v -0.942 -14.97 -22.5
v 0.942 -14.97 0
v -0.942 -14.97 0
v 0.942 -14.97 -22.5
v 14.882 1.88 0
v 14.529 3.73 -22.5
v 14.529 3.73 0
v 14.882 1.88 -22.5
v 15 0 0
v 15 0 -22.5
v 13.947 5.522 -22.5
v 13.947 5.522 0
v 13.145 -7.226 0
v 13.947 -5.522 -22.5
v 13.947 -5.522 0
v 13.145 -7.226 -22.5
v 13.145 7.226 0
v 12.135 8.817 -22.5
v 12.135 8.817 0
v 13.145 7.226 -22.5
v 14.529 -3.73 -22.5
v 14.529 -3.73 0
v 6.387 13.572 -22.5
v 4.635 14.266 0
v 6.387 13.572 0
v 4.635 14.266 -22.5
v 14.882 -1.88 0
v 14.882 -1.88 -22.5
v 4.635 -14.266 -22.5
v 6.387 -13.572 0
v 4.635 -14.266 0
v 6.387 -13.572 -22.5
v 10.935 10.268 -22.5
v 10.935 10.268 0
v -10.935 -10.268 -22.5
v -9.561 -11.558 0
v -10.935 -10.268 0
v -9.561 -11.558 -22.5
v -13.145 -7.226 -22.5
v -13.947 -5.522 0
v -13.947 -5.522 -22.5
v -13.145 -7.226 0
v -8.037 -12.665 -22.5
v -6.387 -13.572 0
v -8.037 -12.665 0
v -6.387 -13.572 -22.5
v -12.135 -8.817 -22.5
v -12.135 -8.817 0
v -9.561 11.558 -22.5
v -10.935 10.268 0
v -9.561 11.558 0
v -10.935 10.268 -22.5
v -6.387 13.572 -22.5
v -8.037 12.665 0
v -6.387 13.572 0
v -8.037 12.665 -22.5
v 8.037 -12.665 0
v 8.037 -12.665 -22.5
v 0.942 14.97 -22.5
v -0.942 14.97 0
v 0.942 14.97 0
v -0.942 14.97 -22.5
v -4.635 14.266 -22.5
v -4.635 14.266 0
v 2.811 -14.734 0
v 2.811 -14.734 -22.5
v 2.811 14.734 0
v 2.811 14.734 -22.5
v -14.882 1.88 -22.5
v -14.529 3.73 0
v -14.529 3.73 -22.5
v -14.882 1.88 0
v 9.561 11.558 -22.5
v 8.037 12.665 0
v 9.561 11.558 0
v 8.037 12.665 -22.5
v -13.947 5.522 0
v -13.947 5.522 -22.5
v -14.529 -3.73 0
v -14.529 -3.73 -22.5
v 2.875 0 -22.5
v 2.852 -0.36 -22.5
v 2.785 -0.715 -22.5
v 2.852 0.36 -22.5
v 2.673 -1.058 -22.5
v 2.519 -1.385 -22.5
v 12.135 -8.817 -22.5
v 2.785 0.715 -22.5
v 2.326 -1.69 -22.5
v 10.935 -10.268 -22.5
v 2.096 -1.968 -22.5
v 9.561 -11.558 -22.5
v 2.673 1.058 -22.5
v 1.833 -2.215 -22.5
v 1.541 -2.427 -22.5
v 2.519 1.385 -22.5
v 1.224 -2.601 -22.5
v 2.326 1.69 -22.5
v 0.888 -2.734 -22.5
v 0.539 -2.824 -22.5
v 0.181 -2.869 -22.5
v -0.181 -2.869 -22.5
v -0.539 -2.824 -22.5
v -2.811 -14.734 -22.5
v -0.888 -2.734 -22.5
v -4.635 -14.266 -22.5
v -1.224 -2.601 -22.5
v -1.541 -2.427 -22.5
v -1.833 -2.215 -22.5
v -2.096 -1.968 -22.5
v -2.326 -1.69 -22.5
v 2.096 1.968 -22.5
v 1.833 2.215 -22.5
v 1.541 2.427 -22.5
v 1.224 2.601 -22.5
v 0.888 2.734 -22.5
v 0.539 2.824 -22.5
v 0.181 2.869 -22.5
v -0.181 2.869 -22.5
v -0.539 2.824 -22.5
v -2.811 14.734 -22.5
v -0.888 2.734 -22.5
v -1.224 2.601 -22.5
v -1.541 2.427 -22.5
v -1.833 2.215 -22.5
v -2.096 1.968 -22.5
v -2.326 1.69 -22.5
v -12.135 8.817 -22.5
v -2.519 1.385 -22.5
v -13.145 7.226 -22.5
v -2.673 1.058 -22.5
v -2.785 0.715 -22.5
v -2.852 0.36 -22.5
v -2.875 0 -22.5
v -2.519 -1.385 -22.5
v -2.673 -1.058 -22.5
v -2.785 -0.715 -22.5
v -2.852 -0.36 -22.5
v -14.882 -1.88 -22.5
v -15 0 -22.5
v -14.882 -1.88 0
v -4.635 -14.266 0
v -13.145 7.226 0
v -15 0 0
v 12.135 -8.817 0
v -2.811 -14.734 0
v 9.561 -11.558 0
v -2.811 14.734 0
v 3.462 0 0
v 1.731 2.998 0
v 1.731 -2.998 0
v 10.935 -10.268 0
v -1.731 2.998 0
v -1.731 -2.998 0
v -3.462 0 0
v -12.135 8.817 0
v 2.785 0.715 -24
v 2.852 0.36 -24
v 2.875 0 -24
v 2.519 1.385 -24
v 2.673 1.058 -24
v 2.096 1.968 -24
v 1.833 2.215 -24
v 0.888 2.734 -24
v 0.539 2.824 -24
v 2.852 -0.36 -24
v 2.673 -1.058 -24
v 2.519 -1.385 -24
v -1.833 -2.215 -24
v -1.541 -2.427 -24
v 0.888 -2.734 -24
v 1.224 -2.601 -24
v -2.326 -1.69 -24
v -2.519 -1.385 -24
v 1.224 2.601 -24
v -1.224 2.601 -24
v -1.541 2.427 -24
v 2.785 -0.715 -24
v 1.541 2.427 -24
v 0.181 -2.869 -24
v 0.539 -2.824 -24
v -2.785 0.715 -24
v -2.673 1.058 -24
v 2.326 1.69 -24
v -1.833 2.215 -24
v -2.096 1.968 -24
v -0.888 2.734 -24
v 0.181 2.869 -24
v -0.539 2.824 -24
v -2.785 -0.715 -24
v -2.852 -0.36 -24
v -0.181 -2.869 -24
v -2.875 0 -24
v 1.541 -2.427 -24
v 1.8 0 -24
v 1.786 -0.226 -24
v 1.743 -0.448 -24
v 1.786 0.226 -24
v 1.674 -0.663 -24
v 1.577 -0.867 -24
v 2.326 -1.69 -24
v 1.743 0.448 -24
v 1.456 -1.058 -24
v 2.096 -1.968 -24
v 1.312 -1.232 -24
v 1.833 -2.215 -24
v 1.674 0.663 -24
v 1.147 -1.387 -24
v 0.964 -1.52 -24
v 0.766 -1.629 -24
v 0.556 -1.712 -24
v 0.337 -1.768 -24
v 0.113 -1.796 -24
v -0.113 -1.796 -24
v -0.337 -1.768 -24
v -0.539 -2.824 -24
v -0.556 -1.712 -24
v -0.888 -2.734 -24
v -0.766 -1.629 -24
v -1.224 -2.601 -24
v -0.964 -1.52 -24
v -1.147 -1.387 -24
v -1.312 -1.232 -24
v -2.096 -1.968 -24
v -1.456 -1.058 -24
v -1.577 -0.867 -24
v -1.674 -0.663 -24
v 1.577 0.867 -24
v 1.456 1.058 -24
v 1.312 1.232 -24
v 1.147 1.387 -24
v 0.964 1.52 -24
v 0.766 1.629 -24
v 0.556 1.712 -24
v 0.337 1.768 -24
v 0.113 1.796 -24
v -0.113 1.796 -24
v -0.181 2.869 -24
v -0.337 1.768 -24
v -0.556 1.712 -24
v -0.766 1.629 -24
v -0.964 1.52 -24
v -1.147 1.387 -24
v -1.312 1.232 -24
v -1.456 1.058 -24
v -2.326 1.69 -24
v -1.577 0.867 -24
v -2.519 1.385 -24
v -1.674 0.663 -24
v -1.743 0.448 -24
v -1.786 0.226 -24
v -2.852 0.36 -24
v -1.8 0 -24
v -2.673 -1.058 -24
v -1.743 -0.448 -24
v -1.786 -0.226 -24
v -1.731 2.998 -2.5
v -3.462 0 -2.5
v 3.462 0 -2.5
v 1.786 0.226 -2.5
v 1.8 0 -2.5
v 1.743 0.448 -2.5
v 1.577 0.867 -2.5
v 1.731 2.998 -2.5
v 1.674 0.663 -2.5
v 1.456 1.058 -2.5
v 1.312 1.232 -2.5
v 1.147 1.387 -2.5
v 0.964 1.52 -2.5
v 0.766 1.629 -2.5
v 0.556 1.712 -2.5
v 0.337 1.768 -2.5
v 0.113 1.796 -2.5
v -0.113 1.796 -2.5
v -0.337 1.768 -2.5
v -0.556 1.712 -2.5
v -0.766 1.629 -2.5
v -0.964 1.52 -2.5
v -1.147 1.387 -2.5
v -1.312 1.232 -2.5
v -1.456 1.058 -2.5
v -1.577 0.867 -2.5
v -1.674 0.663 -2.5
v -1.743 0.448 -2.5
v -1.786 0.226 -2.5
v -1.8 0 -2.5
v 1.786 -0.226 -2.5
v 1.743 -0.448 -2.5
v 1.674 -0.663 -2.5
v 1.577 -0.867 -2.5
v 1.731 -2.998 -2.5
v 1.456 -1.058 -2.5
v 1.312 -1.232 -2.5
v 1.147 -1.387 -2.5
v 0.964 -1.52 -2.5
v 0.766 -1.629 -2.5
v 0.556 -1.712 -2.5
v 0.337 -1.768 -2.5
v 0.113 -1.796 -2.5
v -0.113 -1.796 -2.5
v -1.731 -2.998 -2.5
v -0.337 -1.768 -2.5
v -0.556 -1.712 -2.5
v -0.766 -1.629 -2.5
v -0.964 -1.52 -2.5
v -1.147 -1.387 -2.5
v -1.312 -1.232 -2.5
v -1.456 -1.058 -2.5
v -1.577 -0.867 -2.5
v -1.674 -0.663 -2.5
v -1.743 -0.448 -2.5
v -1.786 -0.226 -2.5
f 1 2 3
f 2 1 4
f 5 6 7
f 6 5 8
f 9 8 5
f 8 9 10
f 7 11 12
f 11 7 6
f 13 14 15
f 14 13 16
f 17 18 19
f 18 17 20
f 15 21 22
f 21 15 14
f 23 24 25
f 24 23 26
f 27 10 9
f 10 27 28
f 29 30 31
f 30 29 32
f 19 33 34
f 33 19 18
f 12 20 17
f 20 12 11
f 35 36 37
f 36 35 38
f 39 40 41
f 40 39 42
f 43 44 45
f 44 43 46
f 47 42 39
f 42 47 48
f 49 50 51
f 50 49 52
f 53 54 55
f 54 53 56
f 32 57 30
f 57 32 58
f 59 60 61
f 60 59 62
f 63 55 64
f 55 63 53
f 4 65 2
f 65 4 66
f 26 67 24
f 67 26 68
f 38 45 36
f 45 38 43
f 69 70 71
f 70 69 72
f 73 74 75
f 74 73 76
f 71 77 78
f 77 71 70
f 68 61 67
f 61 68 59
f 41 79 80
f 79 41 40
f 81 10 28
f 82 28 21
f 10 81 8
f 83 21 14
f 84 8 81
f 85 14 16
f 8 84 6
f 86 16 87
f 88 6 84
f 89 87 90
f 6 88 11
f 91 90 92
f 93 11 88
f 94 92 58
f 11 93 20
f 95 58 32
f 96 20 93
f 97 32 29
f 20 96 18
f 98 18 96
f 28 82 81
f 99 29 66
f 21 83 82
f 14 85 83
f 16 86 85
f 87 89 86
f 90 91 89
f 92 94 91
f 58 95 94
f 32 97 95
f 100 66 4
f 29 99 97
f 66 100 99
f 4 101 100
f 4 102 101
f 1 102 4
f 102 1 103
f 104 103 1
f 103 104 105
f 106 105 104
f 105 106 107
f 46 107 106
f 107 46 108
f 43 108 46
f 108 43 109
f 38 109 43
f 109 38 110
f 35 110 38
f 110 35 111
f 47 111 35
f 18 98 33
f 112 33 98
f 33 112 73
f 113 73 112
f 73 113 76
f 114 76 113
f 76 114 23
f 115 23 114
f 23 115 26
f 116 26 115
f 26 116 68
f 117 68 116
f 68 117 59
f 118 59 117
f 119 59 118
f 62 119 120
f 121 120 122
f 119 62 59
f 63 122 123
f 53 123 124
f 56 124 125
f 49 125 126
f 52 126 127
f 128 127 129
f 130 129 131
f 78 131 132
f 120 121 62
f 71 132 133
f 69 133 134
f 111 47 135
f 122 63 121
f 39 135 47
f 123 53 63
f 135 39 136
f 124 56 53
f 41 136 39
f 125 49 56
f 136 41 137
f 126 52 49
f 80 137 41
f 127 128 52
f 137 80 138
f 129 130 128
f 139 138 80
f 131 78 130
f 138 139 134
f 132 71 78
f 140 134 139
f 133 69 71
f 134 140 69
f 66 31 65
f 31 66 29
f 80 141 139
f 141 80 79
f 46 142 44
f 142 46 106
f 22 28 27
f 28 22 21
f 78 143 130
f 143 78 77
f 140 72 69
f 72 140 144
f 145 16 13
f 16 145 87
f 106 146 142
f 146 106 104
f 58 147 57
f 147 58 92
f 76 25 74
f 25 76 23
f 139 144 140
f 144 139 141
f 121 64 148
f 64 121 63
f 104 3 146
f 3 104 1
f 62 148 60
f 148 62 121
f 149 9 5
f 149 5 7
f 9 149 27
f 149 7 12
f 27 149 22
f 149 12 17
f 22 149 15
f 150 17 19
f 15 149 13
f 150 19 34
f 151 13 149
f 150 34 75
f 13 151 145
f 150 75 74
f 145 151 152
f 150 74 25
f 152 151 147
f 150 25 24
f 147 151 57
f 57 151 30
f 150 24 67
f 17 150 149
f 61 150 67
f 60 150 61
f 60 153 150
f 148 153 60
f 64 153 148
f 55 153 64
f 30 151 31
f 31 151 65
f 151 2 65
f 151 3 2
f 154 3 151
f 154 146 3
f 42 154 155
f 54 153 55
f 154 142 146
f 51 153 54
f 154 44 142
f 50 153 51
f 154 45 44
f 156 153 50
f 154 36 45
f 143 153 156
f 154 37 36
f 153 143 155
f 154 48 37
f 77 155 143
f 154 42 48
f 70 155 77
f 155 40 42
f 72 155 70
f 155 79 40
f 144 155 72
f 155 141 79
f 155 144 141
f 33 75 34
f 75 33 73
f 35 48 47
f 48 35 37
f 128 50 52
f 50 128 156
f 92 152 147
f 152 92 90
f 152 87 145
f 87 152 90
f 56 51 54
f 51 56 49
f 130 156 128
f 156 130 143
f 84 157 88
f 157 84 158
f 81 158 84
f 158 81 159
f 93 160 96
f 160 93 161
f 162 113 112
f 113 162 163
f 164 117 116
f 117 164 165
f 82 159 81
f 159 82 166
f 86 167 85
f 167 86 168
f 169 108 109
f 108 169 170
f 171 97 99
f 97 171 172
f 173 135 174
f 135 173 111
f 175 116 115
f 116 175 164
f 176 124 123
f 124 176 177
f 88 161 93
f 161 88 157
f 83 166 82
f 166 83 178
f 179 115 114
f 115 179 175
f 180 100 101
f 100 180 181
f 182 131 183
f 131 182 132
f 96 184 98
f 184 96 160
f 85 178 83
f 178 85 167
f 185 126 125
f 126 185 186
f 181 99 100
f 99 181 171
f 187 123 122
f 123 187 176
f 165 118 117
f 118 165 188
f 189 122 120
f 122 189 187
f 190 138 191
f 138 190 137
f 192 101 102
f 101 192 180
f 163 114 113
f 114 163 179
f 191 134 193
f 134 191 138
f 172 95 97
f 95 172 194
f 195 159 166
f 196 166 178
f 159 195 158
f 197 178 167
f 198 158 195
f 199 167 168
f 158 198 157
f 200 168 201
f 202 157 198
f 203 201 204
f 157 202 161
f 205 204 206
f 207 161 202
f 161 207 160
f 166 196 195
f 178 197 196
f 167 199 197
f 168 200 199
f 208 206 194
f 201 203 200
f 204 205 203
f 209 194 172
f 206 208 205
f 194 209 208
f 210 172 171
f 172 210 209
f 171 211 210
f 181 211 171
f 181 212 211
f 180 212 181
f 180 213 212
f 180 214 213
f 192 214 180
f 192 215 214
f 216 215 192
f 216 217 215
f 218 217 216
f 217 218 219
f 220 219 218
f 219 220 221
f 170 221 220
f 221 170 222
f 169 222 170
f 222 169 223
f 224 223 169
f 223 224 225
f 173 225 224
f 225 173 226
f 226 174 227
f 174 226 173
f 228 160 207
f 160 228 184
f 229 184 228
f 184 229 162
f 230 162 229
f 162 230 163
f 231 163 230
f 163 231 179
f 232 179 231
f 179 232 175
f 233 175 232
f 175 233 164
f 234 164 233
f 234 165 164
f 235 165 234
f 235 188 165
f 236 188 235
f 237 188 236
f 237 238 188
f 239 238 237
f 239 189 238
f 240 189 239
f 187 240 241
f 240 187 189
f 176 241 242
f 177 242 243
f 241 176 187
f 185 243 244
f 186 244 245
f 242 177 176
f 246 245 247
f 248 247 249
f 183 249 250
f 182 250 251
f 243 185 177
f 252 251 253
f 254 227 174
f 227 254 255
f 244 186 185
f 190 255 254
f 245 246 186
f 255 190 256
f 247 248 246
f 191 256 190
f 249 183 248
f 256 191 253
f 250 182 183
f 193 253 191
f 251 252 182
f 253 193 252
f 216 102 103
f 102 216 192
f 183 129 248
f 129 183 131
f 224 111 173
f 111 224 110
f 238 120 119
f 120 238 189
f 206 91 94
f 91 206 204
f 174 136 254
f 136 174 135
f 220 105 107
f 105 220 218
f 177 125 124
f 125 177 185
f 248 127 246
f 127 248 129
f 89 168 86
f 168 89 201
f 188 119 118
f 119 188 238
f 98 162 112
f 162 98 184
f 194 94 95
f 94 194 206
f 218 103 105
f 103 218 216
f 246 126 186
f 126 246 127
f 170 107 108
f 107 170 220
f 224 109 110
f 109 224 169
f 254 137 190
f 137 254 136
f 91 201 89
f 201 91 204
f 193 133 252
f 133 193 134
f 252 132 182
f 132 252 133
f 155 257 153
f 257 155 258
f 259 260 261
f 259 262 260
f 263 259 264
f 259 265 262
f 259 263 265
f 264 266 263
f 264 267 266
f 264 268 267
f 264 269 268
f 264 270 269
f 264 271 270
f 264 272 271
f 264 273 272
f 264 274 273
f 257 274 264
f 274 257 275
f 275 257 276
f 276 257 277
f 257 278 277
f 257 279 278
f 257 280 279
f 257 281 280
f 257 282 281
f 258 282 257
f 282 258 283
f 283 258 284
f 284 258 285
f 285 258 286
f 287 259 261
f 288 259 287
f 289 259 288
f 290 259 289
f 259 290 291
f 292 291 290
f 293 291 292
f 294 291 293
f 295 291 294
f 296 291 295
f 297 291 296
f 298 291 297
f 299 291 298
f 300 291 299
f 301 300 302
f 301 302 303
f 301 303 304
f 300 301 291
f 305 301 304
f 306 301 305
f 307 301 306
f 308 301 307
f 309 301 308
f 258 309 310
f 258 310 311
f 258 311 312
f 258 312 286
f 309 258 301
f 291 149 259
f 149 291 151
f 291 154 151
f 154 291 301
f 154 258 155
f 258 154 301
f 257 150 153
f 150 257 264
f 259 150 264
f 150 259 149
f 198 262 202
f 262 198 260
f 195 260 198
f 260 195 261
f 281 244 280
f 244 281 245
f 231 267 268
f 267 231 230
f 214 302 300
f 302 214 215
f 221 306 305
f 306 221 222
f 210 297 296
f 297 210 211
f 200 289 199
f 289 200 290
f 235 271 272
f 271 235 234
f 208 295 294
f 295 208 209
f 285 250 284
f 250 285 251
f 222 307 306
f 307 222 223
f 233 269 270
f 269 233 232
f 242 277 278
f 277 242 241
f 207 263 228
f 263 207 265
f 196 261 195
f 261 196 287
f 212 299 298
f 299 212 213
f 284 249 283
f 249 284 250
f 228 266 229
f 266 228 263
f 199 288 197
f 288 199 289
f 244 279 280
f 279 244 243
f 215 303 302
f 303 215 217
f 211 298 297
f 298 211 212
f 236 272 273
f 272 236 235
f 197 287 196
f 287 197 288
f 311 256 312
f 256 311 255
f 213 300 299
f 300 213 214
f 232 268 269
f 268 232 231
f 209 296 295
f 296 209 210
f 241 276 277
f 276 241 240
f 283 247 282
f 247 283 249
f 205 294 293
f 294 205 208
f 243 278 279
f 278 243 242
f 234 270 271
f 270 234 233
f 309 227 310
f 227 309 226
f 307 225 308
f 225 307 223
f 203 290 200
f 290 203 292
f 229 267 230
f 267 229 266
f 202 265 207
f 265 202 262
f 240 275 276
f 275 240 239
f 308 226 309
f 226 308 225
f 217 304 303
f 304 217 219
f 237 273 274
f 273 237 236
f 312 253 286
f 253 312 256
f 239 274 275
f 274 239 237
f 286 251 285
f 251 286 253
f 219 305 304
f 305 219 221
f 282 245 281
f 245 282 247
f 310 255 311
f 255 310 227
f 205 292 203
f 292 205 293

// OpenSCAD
$fn = 50;

difference() {
	union() {
		translate(v = [0, 0, -22.5]) {
			cylinder(h = 22.5, r = 15.0);
		}
		#translate(v = [0, 0, -24.0]) {
			cylinder(h = 24, r = 2.875);
		}
	}
	union() {
		translate(v = [0, 0, 0]) {
			rotate(a = [0, 0, 0]) {
				difference() {
					union() {
						translate(v = [0, 0, -2.5]) {
							linear_extrude(height = 2.5) {
								polygon(points = [[3.4619999999999997, 0.0], [1.7310000000000003, 2.9981799479017264], [-1.7309999999999992, 2.9981799479017264], [-3.4619999999999997, 4.2397272186481365e-16], [-1.7310000000000014, -2.998179947901726], [1.7309999999999977, -2.9981799479017277]]);
							}
						}
					}
					union();
				}
			}
		}
		#translate(v = [0, 0, -100.0]) {
			cylinder(h = 200, r = 1.8);
		}
	}
}
